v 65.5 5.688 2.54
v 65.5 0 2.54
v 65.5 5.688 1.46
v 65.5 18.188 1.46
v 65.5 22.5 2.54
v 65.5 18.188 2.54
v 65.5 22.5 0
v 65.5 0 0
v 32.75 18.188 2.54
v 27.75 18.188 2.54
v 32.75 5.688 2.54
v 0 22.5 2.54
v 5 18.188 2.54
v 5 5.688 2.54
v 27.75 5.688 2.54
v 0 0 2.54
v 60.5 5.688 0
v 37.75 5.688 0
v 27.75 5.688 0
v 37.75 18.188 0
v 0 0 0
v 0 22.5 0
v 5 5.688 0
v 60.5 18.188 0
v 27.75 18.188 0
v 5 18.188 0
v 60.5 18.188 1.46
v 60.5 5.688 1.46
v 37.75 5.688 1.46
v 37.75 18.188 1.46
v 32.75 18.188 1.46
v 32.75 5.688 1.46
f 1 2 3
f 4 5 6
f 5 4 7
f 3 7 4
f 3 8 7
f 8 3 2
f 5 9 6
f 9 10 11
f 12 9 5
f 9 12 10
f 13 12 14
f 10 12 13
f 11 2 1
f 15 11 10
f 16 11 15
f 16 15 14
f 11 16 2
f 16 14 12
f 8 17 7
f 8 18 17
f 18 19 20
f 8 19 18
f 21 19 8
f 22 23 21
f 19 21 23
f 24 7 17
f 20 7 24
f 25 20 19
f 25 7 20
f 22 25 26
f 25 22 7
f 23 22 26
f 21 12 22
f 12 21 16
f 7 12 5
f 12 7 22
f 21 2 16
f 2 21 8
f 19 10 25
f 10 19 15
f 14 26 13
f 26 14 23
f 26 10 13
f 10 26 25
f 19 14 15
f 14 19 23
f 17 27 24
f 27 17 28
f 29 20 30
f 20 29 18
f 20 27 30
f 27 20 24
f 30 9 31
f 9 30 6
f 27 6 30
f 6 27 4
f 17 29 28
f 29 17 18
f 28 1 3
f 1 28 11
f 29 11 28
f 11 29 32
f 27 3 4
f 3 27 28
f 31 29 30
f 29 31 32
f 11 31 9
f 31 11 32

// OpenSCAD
width_servo     = 22.75;
width_space     = 10;

height_servo    = 12.50;
height_space    = 5;

width_pcb       = 2*width_servo + 2*width_space;
height_pcb      = height_servo + 2*height_space;

thickness       = 2.54;
target          = 4;
thickness_extra = target-thickness;


difference() {
  cube([width_pcb, height_pcb, thickness]);
  translate([width_space/2, width_servo/4, 0]) {
    cube([width_servo, height_servo, thickness]);
  }
  translate([width_pcb-width_servo-width_space/2, width_servo/4, 0]) {
    cube([width_servo, height_servo, thickness+thickness_extra]);
  }
  translate([width_pcb-width_servo-width_space/2-width_space/2, width_servo/4, thickness_extra]) {
    cube([width_servo+width_space, height_servo, target]);
  }
}
